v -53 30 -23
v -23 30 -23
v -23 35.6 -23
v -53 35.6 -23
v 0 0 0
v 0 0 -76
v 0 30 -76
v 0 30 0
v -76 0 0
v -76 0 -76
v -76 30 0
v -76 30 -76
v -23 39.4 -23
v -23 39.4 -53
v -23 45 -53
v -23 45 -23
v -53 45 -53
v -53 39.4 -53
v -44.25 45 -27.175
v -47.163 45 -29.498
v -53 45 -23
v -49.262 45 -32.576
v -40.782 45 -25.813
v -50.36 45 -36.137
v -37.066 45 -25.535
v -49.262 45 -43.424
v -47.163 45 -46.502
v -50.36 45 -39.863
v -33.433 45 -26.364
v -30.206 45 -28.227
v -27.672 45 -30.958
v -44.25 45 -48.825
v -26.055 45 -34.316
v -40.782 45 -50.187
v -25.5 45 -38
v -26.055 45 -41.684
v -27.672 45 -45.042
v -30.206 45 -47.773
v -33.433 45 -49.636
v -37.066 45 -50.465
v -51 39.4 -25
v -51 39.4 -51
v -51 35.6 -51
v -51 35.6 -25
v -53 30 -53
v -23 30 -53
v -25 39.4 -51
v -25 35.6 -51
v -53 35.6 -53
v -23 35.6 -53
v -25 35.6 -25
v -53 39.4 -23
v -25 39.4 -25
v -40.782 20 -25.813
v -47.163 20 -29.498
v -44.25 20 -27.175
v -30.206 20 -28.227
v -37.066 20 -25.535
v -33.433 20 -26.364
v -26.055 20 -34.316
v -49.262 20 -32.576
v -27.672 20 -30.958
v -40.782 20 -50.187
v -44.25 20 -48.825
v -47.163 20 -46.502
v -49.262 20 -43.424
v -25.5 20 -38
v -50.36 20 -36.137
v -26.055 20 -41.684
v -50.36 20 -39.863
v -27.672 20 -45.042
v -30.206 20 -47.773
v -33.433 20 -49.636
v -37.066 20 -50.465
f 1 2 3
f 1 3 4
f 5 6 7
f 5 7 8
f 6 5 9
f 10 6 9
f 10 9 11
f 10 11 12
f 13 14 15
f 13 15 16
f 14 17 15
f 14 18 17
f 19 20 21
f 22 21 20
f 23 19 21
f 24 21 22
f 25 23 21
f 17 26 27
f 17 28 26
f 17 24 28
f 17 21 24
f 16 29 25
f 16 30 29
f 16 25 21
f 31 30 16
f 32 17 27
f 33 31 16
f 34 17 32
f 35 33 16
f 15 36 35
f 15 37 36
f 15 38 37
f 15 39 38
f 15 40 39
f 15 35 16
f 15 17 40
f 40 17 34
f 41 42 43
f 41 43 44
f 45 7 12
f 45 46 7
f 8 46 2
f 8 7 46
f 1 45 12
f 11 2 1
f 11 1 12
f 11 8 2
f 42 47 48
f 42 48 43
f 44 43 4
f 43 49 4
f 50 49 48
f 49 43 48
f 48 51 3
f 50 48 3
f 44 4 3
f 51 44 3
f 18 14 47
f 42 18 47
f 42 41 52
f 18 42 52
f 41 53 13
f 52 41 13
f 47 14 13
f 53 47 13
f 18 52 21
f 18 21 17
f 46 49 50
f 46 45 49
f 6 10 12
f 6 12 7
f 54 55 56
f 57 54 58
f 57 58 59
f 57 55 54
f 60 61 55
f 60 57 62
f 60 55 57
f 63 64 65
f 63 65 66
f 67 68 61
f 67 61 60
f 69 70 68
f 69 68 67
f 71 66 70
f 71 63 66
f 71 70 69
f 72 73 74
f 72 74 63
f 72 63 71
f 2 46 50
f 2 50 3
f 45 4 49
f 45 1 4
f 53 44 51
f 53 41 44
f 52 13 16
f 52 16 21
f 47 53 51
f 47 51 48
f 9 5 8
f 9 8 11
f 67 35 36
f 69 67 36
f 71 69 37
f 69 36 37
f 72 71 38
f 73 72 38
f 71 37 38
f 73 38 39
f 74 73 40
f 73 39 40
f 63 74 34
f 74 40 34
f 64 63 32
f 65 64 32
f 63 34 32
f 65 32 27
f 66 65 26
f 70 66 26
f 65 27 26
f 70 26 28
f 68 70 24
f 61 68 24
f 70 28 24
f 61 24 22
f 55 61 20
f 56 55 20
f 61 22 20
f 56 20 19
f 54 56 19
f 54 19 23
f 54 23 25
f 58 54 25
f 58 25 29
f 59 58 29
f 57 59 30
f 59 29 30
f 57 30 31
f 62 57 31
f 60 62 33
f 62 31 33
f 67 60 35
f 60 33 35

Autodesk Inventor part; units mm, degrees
ref_plane "YZ Plane" through (0, 0, 0) normal (1, 0, 0) x (0, 1, 0)
ref_plane "XZ Plane" through (0, 0, 0) normal (0, 1, 0) x (-1, 0, 0)
ref_plane "XY Plane" through (0, 0, 0) normal (0, 0, 1) x (1, 0, 0)
sketch "Sketch2" plane through (0, 0, 0) normal (0, 1, 0) x (-1, 0, 0)
  point P0 (0, 0)
sketch "Sketch3" plane through (0, 0, 0) normal (0, 1, 0) x (-1, 0, 0)
  line L0 (0, 0) -> (76, 0)
  line L1 (76, 0) -> (76, -76)
  line L2 (76, -76) -> (0, -76)
  line L3 (0, -76) -> (0, 0)
  dimension "d1" = 76
  dimension "d2" = 76
extrude "Extrusion1" add sketch "Sketch3" along normal blind 30
sketch "Sketch4" plane through (0, 30, 0) normal (0, 1, 0) x (1, 0, 0)
  line L0 (-76, 0) -> (0, 0) projected
  line L1 (0, 0) -> (0, 76) projected
  line L2 (-23, 23) -> (-53, 23)
  line L3 (-53, 23) -> (-53, 53)
  line L4 (-53, 53) -> (-23, 53)
  line L5 (-23, 53) -> (-23, 23)
  point P0 (-38, 38)
  dimension "d5" = 30
  dimension "d6" = 30
extrude "Extrusion2" add sketch "Sketch4" along normal blind 15
sketch "Sketch5" plane through (-23, 30, -23) normal (1, 0, 0) x (0, 0, -1)
  line L0 (0, 0) -> (0, 15) projected
  line L1 (30, 0) -> (30, 15) projected
  line L2 (0, 5.6) -> (30, 5.6)
  line L3 (30, 5.6) -> (30, 9.4)
  line L4 (30, 9.4) -> (0, 9.4)
  line L5 (0, 9.4) -> (0, 5.6)
  point P0 (-23, -30)
  point P1 (15, 7.5)
  dimension "d9" = 3.8
sketch "Sketch6" plane through (-23, 30, -53) normal (0, 0, -1) x (-1, 0, 0)
  line L0 (0, 0) -> (0, 15) projected
  line L1 (30, 0) -> (30, 15) projected
  line L2 (0, 5.6) -> (30, 5.6)
  line L3 (30, 5.6) -> (30, 9.4)
  line L4 (30, 9.4) -> (0, 9.4)
  line L5 (0, 9.4) -> (0, 5.6)
  point P0 (-23, -30)
  point P1 (15, 7.5)
  dimension "d10" = 3.8
sketch "Sketch7" plane through (-53, 30, -53) normal (-1, 0, 0) x (0, 0, 1)
  line L0 (0, 0) -> (0, 15) projected
  line L1 (30, 0) -> (30, 15) projected
  line L2 (0, 5.6) -> (30, 5.6)
  line L3 (30, 5.6) -> (30, 9.4)
  line L4 (30, 9.4) -> (0, 9.4)
  line L5 (0, 9.4) -> (0, 5.6)
  point P0 (53, -30)
  point P1 (15, 7.5)
  dimension "d11" = 3.8
sketch "Sketch8" plane through (-53, 30, -23) normal (0, 0, 1) x (1, 0, 0)
  line L0 (0, 0) -> (0, 15) projected
  line L1 (30, 0) -> (30, 15) projected
  line L2 (0, 5.6) -> (30, 5.6)
  line L3 (30, 5.6) -> (30, 9.4)
  line L4 (30, 9.4) -> (0, 9.4)
  line L5 (0, 9.4) -> (0, 5.6)
  point P0 (53, -30)
  point P1 (15, 7.5)
  dimension "d12" = 3.8
extrude "Extrusion3" cut sketch "Sketch8" against normal blind 2
extrude "Extrusion4" cut sketch "Sketch7" against normal blind 2
extrude "Extrusion5" cut sketch "Sketch6" against normal blind 2
extrude "Extrusion6" cut sketch "Sketch5" against normal blind 2
sketch "Sketch9" plane through (0, 45, 0) normal (0, 1, 0) x (1, 0, 0)
  line L0 (-23, 53) -> (-53, 53) projected
  line L1 (-53, 23) -> (-23, 23) projected
  circle A0 centre (-38, 38) radius 12.5
  point P0 (0, 0)
  dimension "d21" = 25
extrude "Extrusion7" cut sketch "Sketch9" against normal blind 25
properties part number "Hydraulic cylinder part 1"
